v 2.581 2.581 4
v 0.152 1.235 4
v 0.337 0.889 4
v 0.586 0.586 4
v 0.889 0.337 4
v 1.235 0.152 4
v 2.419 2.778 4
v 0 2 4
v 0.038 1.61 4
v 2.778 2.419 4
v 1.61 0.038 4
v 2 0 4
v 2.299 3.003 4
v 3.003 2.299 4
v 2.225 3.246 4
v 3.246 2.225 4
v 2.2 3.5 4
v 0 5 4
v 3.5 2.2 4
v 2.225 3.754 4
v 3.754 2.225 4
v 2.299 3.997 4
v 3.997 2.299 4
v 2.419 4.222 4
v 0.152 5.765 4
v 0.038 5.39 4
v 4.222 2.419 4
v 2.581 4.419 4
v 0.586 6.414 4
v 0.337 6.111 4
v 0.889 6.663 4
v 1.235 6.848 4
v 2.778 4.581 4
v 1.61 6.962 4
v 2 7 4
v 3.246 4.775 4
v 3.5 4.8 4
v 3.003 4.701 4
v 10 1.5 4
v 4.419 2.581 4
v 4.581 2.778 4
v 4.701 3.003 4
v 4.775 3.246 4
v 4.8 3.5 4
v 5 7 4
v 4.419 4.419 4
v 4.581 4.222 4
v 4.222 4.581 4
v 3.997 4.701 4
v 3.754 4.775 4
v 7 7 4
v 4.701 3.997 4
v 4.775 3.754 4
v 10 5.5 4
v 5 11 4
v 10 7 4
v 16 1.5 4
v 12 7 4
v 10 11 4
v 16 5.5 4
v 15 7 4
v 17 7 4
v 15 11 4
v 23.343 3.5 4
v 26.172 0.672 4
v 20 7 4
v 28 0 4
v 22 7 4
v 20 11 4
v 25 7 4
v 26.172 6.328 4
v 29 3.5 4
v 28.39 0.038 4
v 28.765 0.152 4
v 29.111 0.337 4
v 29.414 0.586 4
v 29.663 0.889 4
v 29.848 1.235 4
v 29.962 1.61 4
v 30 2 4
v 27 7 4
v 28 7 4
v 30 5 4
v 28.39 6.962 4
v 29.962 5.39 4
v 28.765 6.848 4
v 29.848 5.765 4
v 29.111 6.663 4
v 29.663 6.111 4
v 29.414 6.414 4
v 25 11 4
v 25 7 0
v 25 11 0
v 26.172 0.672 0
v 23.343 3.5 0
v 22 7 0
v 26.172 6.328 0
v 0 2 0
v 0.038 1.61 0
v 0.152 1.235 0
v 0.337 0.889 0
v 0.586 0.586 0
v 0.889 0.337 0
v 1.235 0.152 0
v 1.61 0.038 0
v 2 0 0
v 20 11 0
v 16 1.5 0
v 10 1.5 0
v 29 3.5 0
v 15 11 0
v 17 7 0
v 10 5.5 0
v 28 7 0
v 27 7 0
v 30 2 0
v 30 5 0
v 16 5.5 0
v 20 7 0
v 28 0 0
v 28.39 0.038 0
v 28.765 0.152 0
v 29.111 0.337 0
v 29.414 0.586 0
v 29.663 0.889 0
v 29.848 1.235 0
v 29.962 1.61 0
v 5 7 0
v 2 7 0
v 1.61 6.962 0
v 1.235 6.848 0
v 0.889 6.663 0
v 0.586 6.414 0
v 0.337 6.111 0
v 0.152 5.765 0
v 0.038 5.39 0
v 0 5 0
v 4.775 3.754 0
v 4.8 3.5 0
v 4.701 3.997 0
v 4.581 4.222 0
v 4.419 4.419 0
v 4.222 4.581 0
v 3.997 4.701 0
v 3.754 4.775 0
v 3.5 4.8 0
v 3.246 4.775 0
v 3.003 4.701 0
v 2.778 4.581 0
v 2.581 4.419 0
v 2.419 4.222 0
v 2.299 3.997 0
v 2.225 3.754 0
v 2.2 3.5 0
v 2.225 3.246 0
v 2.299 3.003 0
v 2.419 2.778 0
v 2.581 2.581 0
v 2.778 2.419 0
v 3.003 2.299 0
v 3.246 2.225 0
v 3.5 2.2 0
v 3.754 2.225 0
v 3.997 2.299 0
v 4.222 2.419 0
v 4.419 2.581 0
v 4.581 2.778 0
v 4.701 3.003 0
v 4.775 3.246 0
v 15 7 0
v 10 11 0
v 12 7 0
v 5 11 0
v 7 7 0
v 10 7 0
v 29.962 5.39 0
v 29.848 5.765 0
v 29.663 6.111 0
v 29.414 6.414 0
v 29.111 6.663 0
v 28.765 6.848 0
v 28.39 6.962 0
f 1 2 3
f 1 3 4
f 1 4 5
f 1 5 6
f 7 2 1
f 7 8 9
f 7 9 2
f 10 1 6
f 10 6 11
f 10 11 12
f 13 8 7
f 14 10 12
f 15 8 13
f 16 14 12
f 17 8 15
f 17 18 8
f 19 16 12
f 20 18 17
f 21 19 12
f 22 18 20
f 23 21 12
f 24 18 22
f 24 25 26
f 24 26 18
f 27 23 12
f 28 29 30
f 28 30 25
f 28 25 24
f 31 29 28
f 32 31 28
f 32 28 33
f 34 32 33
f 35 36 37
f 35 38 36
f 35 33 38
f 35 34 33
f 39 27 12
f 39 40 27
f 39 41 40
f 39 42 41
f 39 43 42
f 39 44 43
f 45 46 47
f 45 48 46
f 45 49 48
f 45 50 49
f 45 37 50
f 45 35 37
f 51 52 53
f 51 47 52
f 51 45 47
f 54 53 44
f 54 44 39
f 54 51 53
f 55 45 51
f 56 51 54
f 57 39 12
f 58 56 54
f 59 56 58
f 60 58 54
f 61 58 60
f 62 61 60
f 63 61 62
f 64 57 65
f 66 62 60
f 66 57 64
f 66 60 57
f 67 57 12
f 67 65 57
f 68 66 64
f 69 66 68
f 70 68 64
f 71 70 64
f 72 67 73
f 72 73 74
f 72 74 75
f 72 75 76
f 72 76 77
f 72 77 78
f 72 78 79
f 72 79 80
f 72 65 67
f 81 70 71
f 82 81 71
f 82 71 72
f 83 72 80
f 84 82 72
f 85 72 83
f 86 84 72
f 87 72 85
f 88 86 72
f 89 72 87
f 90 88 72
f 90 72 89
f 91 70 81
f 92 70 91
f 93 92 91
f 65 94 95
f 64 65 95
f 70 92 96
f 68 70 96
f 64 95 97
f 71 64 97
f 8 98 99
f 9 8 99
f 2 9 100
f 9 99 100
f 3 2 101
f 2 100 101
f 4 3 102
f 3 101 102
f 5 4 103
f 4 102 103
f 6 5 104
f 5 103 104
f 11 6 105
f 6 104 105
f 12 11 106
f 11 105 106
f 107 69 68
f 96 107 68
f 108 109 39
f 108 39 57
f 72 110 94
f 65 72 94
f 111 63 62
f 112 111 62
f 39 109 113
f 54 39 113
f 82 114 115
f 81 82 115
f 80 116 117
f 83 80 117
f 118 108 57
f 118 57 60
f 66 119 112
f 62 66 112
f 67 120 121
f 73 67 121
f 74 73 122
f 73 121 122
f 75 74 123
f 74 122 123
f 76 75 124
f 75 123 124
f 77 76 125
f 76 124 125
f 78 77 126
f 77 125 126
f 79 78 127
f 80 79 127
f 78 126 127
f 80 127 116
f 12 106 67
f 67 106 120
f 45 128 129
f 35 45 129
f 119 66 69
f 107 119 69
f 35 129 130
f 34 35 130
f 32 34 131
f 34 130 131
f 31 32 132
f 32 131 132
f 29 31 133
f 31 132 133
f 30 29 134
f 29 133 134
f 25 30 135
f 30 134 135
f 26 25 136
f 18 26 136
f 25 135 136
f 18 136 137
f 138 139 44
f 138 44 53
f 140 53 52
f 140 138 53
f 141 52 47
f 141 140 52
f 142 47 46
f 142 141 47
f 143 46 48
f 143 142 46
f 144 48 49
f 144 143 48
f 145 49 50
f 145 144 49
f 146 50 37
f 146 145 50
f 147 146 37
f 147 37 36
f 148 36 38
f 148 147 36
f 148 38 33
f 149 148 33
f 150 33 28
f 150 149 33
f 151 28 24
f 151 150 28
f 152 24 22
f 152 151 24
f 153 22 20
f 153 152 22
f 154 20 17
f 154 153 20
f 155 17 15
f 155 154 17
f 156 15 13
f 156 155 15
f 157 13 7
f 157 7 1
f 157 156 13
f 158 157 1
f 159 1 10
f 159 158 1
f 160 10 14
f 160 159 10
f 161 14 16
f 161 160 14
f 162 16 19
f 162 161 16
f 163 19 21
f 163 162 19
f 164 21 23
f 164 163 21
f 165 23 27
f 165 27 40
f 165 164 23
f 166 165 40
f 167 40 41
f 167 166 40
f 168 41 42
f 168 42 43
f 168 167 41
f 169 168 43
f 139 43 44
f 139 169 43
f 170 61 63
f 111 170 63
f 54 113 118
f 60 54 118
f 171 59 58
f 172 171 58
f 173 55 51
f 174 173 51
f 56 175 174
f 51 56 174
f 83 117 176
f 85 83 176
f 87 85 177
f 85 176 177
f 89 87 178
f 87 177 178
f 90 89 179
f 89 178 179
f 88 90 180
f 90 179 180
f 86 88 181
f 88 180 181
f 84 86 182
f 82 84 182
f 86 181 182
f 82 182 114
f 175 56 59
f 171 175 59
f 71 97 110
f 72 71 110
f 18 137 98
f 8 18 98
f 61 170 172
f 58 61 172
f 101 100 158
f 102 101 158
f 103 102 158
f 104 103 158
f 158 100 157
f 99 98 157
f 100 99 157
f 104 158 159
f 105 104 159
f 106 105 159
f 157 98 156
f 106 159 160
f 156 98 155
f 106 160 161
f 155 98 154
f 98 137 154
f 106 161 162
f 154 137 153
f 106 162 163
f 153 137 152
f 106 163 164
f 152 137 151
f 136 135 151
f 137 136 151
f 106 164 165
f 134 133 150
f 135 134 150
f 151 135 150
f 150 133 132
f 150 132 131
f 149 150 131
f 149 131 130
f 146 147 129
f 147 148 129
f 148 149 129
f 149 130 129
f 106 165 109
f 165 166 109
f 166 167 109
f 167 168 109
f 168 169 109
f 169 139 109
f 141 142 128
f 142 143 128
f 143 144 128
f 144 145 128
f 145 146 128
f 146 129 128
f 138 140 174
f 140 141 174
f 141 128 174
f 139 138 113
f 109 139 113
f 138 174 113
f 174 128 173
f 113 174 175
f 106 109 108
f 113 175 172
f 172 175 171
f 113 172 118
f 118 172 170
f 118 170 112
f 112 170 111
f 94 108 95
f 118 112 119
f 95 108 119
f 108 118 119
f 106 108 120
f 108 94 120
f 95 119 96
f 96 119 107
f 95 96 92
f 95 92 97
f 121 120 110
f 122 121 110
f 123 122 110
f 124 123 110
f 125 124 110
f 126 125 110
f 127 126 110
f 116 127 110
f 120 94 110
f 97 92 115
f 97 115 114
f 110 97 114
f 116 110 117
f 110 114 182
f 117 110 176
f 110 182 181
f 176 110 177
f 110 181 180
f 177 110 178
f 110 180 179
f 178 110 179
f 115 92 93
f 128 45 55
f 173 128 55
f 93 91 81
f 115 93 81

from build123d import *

# Parameters (mm, degrees)
SKETCH_1_R      = 1.3
SKETCH_1_W      = 6
SKETCH_1_H      = 4
EXTRUDE_1_DEPTH = 4
EXTRUDE_2_DEPTH = 4


with BuildPart() as part:
    # Эскиз1 → Бобышка-Вытянуть1 (new body)
    with BuildSketch(Plane.XY):
        with BuildLine():
            Line((2, 0), (28, 0))
            ThreePointArc((28, 0), (29.414213562, 0.585786438), (30, 2))
            Line((30, 2), (30, 5))
            ThreePointArc((30, 5), (29.414213562, 6.414213562), (28, 7))
            Line((28, 7), (2, 7))
            ThreePointArc((2, 7), (0.585786438, 6.414213562), (0, 5))
            Line((0, 5), (0, 2))
            ThreePointArc((0, 2), (0.585786438, 0.585786438), (2, 0))
        make_face()
        with Locations((3.5, 3.5)):
            Circle(SKETCH_1_R, mode=Mode.SUBTRACT)
        Polygon((23.343145751, 3.5), (26.171572875, 6.328427125), (29, 3.5), (26.171572875, 0.671572875), align=None, mode=Mode.SUBTRACT)
        with Locations((13, 3.5)):
            Rectangle(SKETCH_1_W, SKETCH_1_H, mode=Mode.SUBTRACT)
    extrude(amount=EXTRUDE_1_DEPTH)

    # Эскиз2 → Бобышка-Вытянуть2 (add)
    with BuildSketch(Plane.XY.offset(4)):
        Polygon((5, 7), (5, 11), (7, 7), align=None)
        Polygon((10, 7), (10, 11), (12, 7), align=None)
        Polygon((15, 7), (15, 11), (17, 7), align=None)
        Polygon((20, 7), (20, 11), (22, 7), align=None)
        Polygon((25, 7), (25, 11), (27, 7), align=None)
    extrude(amount=-EXTRUDE_2_DEPTH)


solid = part.part
